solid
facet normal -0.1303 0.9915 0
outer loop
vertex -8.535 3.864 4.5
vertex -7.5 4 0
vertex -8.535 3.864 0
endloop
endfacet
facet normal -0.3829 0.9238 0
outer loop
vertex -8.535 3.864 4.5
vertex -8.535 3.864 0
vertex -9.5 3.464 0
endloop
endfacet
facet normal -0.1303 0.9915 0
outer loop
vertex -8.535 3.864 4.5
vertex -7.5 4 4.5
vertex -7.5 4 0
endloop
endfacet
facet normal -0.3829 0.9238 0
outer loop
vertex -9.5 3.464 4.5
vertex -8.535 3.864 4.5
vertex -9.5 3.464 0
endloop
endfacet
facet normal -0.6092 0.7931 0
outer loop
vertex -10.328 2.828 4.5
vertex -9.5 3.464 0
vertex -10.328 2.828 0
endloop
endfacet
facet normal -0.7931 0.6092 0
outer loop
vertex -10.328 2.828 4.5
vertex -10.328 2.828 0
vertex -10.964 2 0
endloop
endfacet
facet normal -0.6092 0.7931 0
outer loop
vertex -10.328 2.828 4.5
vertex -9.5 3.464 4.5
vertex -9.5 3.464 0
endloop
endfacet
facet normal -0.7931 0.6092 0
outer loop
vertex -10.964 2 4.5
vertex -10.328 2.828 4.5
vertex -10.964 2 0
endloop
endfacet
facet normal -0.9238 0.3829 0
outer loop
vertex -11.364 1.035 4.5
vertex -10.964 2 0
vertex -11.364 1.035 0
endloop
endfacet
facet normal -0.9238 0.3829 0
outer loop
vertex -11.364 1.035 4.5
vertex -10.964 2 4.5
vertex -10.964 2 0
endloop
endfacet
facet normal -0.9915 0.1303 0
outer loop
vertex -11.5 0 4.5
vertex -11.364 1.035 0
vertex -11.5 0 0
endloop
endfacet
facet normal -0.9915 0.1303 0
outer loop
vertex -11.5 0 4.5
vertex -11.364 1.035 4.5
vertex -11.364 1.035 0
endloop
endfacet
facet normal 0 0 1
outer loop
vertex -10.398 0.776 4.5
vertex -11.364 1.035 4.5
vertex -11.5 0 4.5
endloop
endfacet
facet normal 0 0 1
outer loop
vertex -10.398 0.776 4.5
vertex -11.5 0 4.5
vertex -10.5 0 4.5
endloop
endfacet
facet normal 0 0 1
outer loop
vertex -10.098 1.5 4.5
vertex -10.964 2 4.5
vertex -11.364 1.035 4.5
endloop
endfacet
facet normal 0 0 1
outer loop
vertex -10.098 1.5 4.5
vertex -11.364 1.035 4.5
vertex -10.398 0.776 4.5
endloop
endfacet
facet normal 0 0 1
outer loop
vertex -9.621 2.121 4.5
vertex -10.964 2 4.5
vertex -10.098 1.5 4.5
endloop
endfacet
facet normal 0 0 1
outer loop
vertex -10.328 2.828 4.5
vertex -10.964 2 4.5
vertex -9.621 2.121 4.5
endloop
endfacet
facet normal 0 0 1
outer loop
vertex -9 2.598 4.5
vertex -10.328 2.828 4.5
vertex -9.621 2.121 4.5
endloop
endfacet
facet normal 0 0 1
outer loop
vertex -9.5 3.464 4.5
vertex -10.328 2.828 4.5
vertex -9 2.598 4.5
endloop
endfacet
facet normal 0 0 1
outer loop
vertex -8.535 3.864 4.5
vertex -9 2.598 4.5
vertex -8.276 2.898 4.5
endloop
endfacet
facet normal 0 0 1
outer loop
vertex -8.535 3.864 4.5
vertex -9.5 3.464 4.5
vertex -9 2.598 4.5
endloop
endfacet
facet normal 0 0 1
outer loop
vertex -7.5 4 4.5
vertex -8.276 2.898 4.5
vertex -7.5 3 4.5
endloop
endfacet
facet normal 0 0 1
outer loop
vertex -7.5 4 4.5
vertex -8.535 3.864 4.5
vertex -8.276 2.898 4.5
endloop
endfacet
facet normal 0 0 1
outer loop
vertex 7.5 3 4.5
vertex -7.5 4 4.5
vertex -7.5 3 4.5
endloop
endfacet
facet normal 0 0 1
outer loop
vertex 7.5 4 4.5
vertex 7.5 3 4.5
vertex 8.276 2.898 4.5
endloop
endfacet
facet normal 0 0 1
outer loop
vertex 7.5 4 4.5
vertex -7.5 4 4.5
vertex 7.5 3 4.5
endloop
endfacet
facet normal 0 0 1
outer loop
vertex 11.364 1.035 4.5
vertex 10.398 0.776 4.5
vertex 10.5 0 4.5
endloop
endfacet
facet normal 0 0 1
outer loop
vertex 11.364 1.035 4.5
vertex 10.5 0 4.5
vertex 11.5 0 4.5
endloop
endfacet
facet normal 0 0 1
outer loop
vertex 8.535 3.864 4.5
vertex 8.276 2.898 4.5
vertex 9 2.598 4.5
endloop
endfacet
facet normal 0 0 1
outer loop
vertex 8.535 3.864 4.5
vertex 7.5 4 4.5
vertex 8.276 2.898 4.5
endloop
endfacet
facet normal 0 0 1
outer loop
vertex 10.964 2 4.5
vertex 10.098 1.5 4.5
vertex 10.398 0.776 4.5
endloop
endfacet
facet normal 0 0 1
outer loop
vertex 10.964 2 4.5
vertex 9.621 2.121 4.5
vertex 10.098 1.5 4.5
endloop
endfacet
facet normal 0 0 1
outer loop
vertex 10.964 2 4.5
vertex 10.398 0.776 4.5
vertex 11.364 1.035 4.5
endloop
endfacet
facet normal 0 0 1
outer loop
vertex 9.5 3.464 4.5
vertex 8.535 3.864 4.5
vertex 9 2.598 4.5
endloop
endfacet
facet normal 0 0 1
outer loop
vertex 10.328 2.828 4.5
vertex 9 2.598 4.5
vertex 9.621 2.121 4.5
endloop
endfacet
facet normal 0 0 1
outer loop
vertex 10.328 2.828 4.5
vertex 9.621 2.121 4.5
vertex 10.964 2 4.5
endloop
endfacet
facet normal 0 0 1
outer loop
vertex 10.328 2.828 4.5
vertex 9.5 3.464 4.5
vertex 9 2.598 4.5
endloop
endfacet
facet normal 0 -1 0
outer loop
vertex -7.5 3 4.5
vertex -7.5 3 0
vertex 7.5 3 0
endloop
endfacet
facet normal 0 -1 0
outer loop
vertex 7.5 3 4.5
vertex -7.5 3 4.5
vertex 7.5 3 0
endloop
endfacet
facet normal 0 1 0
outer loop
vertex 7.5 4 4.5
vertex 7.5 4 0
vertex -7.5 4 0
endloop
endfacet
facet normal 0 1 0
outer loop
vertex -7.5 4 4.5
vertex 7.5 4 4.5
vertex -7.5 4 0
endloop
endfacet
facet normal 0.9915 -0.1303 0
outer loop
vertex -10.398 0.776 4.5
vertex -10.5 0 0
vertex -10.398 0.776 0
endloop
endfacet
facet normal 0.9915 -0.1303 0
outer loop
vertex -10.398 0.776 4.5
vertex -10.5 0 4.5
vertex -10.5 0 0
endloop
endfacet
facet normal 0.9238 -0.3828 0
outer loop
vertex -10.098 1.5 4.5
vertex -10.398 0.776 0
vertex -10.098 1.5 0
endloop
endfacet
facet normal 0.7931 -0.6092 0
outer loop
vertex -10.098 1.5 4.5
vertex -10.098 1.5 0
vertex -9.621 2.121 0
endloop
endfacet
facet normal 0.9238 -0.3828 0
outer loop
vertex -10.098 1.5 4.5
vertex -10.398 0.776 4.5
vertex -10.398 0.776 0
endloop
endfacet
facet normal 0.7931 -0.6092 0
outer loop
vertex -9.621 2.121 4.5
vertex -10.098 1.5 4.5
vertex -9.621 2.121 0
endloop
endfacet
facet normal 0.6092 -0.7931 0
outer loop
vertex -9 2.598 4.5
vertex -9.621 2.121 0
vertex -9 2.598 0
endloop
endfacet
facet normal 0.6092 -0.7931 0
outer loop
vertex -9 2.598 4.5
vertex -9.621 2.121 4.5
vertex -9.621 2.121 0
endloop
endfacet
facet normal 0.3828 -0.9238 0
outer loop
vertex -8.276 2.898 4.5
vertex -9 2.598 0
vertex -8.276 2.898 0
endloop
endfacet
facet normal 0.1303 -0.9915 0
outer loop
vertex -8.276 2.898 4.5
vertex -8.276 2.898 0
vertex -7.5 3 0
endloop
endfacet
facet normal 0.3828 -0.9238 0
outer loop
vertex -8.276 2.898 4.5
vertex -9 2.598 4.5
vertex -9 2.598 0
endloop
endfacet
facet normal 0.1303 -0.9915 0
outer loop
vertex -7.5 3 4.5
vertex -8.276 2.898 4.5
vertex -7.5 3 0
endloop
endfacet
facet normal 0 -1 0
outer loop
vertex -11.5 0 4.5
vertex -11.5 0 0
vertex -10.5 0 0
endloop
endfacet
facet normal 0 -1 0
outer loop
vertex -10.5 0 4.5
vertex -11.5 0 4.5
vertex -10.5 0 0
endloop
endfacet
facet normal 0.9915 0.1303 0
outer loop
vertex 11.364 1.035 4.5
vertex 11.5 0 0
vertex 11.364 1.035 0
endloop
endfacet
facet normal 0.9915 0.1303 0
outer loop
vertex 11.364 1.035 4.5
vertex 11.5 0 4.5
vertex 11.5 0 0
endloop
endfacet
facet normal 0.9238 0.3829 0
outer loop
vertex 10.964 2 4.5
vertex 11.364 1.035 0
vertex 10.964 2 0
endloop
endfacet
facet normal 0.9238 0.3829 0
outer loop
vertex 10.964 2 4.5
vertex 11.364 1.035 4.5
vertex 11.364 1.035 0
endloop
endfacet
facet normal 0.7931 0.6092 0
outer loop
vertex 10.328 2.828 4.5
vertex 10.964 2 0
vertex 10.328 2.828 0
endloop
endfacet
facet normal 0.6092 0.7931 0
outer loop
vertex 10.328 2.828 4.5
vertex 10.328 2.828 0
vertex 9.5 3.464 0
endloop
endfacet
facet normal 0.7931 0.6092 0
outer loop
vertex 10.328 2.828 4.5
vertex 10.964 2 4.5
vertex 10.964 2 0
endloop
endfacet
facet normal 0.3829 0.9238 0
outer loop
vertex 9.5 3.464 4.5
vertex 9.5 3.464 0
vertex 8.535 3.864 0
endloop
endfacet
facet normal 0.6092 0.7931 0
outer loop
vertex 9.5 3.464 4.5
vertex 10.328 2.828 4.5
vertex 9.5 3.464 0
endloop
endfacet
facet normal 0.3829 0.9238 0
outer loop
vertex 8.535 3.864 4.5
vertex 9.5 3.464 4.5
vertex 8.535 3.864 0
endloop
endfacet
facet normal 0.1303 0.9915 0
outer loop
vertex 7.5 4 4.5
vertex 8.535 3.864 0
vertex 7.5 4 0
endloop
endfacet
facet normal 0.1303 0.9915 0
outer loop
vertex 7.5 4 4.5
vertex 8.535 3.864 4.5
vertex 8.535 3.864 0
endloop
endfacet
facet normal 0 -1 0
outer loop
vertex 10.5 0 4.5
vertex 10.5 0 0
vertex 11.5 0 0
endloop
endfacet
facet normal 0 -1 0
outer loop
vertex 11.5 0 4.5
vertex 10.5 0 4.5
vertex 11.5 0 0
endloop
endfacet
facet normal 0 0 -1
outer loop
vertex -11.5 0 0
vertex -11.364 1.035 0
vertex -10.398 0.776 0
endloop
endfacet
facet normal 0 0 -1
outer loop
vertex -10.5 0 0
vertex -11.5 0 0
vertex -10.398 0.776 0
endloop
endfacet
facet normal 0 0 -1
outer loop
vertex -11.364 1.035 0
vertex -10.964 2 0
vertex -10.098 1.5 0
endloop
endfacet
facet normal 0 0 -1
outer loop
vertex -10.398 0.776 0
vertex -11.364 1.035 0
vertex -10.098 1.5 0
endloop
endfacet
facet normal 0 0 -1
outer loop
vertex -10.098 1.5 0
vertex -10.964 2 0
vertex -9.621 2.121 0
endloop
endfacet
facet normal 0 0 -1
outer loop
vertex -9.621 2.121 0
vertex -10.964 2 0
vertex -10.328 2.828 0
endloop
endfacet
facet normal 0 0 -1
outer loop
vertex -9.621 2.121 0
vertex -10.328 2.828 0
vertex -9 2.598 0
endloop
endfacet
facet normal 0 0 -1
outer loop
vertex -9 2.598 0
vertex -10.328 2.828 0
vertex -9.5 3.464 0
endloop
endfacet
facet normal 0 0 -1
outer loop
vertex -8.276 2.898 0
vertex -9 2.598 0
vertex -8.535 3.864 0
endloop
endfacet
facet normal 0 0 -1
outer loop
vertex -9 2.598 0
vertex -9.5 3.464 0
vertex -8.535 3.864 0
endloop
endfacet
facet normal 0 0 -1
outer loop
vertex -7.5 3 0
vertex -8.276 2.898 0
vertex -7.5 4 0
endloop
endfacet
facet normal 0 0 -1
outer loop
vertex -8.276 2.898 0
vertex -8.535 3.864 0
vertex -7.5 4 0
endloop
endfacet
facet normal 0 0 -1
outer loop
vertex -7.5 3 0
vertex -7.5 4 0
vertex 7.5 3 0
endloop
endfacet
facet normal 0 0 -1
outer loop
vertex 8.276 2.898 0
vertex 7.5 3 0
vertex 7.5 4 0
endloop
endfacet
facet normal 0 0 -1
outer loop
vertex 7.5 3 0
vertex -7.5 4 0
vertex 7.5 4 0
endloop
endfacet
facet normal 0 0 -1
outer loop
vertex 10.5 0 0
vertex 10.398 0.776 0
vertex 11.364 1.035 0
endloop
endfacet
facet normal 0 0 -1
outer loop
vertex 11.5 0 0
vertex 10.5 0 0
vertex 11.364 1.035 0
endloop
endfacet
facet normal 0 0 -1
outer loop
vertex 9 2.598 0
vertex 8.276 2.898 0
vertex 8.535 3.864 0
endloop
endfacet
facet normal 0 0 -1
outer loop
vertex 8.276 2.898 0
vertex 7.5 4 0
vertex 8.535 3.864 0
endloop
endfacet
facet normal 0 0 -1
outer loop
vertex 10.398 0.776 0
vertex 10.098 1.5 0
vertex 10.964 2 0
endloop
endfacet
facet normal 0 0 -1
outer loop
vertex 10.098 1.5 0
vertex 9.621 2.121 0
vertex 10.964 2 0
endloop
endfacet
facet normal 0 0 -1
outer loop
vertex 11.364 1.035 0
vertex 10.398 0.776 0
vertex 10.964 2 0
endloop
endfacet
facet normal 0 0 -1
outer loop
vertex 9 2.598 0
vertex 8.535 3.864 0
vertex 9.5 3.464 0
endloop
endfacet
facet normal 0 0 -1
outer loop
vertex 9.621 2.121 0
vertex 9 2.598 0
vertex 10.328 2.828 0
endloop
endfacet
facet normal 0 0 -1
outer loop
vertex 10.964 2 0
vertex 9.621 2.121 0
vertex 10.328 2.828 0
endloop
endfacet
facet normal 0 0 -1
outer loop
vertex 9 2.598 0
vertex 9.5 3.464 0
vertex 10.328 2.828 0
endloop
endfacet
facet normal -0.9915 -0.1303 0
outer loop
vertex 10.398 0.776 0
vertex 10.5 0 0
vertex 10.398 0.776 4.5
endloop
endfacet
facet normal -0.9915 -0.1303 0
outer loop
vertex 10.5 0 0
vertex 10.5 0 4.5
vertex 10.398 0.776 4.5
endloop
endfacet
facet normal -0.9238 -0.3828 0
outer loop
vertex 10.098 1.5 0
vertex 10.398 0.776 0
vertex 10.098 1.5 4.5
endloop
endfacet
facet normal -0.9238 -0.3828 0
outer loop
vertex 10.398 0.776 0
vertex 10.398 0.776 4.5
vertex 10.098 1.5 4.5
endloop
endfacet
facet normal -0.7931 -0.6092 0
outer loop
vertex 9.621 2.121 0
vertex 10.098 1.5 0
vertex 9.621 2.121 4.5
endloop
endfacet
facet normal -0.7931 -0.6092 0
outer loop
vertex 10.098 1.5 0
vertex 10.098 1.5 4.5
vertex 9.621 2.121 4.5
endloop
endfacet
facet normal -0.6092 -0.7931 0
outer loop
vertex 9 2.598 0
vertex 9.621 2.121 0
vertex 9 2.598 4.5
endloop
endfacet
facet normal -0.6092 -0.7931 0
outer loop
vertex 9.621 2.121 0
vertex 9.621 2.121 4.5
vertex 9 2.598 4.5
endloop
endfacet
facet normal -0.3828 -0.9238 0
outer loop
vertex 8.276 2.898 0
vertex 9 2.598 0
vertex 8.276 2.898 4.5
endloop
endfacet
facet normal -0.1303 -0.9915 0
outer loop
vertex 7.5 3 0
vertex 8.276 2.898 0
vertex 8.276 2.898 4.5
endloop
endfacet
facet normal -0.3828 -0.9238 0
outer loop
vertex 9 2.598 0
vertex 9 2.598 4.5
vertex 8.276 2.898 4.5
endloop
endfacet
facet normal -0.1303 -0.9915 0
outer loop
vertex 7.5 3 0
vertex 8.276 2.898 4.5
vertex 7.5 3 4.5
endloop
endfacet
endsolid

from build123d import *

# Parameters (mm, degrees)
F1_DEPTH = 4.5
F2_R     = 2.99999
F3_R     = 3.99999


# Not quite as in the source:
# - a fillet or chamfer is up to 0.001 mm smaller than in the source, because OpenCascade refuses the exact size


with BuildPart() as f1:
    # F0 (on Top) → F1 (new body)
    with BuildSketch(Plane.XY):
        Polygon((10.5, 3), (10.5, 0), (11.5, 0), (11.5, 4), (-11.5, 4), (-11.5, 0), (-10.5, 0), (-10.5, 3), align=None)
    extrude(amount=F1_DEPTH)

    # F2 (radius 3 in the source; OpenCascade refuses exactly that, so slightly less here)
    f2_edges = [f1.edges().sort_by_distance(p)[0] for p in [
        (10.5, 3, 2.25),
        (-10.5, 3, 2.25),
    ]]
    fillet(f2_edges, radius=F2_R)

    # F3 (radius 4 in the source; OpenCascade refuses exactly that, so slightly less here)
    f3_edges = [f1.edges().sort_by_distance(p)[0] for p in [
        (-11.5, 4, 2.25),
        (11.5, 4, 2.25),
    ]]
    fillet(f3_edges, radius=F3_R)


solid = f1.part
